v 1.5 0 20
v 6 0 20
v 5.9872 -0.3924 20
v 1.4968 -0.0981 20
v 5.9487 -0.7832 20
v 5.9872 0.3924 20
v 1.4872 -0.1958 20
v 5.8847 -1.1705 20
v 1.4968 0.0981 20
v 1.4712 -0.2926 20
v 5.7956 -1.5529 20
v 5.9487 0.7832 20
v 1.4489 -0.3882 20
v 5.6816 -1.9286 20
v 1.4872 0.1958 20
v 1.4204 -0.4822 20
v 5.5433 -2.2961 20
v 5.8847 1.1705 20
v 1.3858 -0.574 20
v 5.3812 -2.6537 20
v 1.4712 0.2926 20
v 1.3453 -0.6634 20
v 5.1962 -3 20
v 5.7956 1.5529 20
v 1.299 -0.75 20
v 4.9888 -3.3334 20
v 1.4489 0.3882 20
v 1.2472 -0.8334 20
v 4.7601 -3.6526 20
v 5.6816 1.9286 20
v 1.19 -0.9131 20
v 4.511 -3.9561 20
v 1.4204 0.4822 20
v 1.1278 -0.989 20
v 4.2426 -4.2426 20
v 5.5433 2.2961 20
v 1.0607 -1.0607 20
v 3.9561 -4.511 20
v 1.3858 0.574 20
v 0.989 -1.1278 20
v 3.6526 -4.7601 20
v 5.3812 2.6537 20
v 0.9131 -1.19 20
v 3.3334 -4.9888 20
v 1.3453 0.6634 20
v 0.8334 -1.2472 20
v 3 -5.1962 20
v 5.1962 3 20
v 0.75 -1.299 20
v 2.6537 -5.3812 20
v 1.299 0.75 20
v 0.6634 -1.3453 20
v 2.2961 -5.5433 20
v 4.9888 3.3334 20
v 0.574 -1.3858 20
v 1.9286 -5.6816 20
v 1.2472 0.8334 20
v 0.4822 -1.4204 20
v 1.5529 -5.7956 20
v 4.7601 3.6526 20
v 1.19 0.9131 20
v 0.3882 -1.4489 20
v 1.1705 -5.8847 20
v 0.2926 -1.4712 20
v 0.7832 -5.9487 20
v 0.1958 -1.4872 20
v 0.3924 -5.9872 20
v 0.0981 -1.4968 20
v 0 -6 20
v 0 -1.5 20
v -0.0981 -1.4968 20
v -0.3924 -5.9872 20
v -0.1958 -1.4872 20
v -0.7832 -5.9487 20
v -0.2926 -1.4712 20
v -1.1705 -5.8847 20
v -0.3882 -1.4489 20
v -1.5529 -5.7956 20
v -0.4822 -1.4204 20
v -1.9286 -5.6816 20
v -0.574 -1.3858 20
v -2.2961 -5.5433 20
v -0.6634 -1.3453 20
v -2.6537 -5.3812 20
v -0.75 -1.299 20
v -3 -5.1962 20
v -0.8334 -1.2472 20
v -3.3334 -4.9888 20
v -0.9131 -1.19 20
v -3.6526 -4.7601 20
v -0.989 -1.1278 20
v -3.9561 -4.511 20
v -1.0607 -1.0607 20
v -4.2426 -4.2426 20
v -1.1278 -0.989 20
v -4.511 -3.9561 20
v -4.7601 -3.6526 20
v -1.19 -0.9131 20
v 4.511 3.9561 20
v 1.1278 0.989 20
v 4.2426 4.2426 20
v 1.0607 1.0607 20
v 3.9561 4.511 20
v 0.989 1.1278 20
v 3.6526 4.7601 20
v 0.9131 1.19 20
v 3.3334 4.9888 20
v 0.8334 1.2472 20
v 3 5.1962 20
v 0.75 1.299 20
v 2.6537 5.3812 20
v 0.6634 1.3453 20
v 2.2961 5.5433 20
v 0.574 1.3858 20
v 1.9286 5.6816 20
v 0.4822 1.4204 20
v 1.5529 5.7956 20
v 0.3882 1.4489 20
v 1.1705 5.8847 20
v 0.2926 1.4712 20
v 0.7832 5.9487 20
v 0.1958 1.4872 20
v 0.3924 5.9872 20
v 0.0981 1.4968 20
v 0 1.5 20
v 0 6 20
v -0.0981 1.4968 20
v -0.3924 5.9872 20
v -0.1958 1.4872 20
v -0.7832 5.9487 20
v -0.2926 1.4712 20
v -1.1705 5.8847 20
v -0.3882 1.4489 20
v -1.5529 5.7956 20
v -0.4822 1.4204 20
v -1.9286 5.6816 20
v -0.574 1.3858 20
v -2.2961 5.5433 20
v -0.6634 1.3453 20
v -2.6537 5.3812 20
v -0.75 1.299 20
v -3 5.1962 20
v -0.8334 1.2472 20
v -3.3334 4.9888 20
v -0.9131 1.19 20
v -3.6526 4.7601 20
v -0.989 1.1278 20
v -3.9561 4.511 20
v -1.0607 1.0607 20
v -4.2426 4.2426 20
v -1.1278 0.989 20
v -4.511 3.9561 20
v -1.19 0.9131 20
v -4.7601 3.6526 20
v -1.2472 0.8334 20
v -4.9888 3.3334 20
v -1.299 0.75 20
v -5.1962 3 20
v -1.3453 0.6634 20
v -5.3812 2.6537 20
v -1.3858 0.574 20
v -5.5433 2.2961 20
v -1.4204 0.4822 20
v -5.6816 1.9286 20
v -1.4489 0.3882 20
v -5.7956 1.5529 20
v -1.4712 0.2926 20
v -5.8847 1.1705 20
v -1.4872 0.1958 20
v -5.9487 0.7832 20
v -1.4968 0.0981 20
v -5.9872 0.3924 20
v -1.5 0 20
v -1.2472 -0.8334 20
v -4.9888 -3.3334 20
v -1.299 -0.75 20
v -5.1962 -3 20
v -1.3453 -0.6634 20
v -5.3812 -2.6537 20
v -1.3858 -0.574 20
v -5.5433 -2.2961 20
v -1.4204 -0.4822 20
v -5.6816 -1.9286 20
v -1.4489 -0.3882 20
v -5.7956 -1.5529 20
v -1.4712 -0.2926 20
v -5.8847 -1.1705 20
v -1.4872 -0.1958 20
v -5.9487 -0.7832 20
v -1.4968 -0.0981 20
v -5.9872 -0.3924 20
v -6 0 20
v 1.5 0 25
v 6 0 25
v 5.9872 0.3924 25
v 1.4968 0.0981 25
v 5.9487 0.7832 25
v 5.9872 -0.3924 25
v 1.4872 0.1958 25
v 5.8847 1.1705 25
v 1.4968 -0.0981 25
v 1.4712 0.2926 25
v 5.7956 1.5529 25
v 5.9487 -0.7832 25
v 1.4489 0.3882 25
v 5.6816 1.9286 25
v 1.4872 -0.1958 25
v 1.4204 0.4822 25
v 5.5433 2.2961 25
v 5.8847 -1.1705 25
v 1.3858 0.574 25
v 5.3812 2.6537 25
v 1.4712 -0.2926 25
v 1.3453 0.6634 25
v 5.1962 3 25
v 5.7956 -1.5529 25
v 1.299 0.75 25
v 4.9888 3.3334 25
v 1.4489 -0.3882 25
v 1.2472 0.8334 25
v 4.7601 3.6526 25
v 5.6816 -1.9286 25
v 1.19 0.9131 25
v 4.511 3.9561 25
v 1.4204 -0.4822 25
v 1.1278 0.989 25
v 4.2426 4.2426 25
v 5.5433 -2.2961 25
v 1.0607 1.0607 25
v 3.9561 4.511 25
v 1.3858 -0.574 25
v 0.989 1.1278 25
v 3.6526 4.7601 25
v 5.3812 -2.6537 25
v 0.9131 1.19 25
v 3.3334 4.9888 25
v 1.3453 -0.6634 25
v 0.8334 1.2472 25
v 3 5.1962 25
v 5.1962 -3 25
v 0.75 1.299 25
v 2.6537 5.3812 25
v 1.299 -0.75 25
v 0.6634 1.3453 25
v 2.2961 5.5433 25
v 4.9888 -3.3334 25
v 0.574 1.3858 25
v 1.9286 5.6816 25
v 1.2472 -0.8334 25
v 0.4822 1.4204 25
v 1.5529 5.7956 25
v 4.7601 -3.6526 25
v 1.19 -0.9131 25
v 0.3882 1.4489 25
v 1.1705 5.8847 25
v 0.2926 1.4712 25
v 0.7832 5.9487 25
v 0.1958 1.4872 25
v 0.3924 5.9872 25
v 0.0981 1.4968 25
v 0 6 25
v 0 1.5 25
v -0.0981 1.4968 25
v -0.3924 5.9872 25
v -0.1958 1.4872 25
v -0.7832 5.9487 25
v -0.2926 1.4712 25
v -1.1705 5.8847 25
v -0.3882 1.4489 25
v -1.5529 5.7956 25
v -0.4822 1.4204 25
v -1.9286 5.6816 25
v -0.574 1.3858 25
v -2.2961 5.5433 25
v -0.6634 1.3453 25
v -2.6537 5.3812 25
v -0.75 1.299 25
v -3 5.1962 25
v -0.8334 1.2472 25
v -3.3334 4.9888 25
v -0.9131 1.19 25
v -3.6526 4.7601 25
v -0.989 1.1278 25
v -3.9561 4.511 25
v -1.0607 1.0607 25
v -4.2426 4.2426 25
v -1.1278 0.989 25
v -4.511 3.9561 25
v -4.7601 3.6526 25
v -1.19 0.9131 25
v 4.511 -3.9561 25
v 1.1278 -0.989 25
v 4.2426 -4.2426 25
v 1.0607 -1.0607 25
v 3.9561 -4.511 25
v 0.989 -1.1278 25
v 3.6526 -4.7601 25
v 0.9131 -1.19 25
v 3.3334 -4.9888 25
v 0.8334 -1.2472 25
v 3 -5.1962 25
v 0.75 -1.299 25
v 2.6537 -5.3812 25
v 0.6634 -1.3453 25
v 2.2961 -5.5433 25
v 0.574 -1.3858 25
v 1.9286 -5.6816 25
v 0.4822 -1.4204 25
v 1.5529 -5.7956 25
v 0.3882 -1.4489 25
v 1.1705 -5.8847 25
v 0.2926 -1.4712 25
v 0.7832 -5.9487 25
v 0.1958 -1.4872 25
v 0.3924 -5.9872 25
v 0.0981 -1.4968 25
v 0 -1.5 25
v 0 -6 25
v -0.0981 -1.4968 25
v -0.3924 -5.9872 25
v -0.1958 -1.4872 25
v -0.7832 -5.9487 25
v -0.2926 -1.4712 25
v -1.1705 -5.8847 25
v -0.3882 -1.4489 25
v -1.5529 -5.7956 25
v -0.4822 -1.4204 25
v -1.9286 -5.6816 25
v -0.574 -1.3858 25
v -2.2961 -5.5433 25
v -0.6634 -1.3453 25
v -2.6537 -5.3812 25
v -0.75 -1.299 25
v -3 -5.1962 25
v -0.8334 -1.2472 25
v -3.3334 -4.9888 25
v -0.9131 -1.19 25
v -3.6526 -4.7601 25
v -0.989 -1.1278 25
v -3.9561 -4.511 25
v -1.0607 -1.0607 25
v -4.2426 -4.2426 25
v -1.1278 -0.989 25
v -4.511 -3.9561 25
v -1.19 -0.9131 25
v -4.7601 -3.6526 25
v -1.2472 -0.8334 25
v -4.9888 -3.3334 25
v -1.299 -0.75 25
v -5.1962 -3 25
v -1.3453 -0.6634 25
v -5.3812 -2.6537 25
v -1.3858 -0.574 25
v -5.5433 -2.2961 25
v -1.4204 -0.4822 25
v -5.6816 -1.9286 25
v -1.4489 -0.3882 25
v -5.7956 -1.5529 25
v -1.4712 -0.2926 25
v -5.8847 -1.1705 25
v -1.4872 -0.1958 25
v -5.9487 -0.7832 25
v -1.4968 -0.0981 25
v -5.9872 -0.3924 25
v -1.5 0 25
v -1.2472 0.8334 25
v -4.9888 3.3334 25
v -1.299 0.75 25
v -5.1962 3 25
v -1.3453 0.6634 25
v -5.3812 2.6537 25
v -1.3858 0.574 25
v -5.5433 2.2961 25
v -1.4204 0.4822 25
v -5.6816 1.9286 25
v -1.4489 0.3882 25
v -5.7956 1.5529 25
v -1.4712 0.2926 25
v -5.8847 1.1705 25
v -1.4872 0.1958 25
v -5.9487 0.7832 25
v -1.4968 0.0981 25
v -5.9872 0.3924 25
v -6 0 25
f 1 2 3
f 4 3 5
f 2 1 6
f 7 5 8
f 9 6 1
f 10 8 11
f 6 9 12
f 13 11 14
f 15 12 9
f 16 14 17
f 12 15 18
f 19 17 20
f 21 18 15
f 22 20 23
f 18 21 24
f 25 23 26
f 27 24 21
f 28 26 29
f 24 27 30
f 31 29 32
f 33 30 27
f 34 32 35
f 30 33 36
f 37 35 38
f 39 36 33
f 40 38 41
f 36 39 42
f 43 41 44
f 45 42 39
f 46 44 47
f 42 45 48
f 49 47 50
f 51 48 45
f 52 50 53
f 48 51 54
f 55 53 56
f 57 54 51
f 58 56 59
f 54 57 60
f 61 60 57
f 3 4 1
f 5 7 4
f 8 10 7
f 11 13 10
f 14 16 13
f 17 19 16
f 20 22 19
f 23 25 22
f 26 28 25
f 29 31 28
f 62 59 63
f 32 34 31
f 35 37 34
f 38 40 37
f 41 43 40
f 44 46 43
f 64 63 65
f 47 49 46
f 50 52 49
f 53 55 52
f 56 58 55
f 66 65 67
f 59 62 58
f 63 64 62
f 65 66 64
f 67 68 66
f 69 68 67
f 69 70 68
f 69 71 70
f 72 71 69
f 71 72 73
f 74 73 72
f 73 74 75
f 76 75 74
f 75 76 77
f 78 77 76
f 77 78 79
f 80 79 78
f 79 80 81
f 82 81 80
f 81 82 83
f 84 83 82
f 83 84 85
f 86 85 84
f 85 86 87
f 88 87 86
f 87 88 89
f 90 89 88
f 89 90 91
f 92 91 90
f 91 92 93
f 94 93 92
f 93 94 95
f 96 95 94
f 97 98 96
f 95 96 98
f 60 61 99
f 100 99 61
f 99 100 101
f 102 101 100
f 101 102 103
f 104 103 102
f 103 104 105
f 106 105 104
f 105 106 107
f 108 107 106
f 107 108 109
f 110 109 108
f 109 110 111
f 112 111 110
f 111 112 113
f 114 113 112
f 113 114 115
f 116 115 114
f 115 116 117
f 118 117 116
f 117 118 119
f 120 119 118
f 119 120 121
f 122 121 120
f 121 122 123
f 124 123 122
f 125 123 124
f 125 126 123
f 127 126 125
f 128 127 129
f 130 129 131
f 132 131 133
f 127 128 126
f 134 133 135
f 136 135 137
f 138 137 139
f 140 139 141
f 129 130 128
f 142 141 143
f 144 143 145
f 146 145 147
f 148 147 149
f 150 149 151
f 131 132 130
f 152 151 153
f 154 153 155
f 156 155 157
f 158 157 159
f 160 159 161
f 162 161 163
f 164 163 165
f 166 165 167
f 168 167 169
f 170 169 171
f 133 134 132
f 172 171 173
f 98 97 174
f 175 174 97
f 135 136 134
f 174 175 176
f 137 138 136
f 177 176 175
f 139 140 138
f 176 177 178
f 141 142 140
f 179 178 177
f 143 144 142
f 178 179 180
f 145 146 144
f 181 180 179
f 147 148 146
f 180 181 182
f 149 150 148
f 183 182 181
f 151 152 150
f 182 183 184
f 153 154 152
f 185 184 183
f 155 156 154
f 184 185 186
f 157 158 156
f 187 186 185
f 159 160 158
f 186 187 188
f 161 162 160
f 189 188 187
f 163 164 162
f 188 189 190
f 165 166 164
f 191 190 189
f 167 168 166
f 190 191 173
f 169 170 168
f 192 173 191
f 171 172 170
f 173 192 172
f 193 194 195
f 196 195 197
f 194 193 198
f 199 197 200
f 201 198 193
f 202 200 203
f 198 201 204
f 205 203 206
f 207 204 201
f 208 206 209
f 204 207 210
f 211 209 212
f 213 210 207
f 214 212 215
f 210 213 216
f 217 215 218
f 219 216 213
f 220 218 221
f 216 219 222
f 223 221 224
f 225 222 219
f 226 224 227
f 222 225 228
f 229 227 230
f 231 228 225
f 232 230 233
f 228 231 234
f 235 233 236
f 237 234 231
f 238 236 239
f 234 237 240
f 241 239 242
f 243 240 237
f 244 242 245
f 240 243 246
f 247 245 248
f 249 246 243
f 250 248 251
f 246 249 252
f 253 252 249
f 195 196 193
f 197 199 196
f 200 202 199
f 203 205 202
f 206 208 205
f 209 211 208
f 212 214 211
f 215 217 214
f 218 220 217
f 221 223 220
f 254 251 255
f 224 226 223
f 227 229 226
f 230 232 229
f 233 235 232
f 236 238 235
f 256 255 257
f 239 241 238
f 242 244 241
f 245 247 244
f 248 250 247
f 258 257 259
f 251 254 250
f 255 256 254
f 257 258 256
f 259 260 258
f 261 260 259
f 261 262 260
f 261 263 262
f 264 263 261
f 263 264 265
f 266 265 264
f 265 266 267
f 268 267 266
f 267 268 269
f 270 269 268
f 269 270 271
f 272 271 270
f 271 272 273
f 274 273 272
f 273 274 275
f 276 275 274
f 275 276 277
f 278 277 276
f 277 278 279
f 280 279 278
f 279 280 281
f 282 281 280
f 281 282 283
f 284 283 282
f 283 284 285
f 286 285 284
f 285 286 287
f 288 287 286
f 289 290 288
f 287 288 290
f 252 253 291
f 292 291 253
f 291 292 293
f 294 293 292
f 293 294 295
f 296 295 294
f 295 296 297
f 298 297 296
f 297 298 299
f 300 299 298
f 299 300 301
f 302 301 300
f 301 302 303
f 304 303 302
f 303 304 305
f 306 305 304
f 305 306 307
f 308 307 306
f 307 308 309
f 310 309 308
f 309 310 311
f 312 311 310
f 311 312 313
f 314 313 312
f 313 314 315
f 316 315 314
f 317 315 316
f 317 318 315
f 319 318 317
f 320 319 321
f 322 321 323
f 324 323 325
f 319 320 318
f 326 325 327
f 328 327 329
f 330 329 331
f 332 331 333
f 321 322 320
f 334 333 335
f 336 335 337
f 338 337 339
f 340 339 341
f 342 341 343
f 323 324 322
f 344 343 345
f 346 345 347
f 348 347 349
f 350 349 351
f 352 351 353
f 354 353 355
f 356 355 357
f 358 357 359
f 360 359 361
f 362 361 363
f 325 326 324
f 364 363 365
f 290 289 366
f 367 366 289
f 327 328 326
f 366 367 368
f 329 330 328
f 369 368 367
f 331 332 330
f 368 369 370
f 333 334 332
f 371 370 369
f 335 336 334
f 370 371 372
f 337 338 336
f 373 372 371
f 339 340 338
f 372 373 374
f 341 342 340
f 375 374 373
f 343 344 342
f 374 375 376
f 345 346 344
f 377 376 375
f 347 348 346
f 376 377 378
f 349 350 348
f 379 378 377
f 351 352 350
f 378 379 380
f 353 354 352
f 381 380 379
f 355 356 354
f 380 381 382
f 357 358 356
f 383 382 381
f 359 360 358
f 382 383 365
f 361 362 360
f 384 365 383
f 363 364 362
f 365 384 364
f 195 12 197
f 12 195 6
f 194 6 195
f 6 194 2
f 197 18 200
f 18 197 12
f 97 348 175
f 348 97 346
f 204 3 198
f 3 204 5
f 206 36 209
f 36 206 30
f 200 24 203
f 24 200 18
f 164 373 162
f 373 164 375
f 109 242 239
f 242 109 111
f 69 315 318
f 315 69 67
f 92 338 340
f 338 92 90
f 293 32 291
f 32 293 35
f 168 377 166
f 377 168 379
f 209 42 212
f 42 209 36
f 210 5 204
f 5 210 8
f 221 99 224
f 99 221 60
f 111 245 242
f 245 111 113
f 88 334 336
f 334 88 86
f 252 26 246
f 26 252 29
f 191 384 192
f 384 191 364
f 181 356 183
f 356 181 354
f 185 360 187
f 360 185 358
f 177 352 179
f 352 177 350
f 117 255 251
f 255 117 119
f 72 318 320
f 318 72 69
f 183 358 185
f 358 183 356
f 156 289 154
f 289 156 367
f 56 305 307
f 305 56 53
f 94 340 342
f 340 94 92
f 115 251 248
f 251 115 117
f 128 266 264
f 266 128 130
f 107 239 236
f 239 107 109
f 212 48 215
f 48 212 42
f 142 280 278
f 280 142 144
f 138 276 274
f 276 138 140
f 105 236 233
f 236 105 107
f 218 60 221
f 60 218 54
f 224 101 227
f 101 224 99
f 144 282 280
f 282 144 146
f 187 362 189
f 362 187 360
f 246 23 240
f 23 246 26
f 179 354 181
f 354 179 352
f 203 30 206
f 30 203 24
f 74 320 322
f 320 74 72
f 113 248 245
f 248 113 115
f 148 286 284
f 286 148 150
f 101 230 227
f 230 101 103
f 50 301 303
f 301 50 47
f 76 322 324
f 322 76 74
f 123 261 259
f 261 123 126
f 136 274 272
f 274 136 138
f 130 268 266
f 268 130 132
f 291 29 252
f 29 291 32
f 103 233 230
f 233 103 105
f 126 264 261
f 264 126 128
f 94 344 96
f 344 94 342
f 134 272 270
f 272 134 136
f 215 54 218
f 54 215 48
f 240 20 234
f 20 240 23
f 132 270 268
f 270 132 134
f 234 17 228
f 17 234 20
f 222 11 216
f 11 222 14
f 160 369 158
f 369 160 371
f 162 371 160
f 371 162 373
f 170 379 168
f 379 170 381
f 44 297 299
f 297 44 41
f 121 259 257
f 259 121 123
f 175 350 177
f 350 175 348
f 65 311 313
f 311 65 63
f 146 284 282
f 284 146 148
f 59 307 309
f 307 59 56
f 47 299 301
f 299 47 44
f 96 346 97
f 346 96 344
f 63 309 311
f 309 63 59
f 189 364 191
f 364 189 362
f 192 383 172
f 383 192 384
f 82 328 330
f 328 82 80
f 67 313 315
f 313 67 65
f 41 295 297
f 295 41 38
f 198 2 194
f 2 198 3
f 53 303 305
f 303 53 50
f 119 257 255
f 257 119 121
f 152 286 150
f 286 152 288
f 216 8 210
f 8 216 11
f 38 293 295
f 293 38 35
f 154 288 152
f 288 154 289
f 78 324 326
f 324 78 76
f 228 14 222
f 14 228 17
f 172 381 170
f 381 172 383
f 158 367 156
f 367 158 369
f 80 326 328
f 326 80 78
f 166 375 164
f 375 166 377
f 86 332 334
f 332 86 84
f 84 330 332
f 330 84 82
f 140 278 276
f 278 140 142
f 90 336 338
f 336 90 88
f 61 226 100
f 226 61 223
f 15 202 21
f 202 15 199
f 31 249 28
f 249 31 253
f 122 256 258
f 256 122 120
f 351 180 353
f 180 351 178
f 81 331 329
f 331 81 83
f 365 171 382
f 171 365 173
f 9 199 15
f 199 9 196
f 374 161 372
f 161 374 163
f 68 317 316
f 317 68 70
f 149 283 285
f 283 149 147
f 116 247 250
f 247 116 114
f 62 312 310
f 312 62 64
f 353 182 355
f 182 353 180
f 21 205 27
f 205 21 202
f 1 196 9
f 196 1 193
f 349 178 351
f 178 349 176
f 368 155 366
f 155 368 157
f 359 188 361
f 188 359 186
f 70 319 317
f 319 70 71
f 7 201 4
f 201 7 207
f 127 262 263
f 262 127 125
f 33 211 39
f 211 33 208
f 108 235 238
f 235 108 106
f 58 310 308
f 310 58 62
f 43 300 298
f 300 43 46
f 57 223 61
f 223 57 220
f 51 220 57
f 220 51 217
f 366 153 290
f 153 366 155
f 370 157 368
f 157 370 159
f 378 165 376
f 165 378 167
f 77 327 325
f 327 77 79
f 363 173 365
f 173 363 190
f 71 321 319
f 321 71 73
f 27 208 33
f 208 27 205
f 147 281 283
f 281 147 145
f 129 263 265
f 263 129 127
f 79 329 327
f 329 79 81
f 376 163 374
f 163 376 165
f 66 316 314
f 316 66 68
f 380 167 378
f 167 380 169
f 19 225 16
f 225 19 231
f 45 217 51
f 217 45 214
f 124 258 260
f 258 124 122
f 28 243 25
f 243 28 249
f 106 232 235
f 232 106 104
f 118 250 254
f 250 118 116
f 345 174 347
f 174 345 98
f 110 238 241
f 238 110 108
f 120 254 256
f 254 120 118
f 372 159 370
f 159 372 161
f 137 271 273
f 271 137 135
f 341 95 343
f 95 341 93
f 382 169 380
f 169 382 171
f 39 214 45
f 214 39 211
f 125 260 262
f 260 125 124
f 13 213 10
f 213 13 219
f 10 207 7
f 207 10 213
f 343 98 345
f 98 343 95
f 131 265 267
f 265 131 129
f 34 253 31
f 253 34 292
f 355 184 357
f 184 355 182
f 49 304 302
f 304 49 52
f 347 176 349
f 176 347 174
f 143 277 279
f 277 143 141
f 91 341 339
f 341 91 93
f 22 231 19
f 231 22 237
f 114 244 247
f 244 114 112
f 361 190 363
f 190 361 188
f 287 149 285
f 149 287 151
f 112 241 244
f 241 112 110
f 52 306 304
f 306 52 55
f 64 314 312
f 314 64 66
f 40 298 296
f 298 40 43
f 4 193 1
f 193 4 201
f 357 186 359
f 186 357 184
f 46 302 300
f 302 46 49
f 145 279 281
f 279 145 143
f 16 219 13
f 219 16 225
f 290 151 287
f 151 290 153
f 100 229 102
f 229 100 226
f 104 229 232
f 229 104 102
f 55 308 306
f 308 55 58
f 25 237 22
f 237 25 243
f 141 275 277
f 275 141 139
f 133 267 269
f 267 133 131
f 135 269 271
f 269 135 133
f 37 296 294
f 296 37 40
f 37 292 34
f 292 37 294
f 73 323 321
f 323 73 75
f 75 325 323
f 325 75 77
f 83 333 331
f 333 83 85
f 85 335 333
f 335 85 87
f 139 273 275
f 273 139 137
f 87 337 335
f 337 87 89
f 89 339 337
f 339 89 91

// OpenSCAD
// Straight hose-barb reducer: 8 mm tubing -> 5 mm tubing
// Print orientation: standing upright along Z, centred on origin in X/Y

$fn = 96;

// ---- Dimensions (mm) ----
reducer_d     = 12;   // collar diameter (8 mm -> 5 mm transition)
reducer_h     = 5;    // collar height (z = 20 to 25)
first_barb_h  = 10;   // 8 mm barb height
first_barb_od = 9.5;  // 8 mm barb top outer diameter
second_barb_h = 8;    // 5 mm barb height
second_barb_od = 5.0; // 5 mm barb top outer diameter
bore_d        = 3;    // through-bore diameter

eps = 0.5;            // overshoot for clean boolean cuts

// ---- Model ----
difference() {
    union() {
        // 8 mm tubing barbs (z = 0 to 20)
        for (z = [0, 10])
            translate([0, 0, z])
                cylinder(h = first_barb_h,
                          r = [first_barb_od / 2, 7.5 / 2],
                          $fn = 96);

        // Collar (z = 20 to 25)
        translate([0, 0, 20])
            cylinder(h = reducer_h, d = reducer_d, $fn = 96);

        // 5 mm tubing barbs (z = 25 to 41)
        for (z = [25, 33])
            translate([0, 0, z])
                cylinder(h = second_barb_h,
                          r = [second_barb_od / 2, 6.5 / 2],
                          $fn = 96);
    }

    // Through-bore along Z
    translate([0, 0, -eps])
        cylinder(h = 41 + 2 * eps, d = bore_d, $fn = 96);
}
